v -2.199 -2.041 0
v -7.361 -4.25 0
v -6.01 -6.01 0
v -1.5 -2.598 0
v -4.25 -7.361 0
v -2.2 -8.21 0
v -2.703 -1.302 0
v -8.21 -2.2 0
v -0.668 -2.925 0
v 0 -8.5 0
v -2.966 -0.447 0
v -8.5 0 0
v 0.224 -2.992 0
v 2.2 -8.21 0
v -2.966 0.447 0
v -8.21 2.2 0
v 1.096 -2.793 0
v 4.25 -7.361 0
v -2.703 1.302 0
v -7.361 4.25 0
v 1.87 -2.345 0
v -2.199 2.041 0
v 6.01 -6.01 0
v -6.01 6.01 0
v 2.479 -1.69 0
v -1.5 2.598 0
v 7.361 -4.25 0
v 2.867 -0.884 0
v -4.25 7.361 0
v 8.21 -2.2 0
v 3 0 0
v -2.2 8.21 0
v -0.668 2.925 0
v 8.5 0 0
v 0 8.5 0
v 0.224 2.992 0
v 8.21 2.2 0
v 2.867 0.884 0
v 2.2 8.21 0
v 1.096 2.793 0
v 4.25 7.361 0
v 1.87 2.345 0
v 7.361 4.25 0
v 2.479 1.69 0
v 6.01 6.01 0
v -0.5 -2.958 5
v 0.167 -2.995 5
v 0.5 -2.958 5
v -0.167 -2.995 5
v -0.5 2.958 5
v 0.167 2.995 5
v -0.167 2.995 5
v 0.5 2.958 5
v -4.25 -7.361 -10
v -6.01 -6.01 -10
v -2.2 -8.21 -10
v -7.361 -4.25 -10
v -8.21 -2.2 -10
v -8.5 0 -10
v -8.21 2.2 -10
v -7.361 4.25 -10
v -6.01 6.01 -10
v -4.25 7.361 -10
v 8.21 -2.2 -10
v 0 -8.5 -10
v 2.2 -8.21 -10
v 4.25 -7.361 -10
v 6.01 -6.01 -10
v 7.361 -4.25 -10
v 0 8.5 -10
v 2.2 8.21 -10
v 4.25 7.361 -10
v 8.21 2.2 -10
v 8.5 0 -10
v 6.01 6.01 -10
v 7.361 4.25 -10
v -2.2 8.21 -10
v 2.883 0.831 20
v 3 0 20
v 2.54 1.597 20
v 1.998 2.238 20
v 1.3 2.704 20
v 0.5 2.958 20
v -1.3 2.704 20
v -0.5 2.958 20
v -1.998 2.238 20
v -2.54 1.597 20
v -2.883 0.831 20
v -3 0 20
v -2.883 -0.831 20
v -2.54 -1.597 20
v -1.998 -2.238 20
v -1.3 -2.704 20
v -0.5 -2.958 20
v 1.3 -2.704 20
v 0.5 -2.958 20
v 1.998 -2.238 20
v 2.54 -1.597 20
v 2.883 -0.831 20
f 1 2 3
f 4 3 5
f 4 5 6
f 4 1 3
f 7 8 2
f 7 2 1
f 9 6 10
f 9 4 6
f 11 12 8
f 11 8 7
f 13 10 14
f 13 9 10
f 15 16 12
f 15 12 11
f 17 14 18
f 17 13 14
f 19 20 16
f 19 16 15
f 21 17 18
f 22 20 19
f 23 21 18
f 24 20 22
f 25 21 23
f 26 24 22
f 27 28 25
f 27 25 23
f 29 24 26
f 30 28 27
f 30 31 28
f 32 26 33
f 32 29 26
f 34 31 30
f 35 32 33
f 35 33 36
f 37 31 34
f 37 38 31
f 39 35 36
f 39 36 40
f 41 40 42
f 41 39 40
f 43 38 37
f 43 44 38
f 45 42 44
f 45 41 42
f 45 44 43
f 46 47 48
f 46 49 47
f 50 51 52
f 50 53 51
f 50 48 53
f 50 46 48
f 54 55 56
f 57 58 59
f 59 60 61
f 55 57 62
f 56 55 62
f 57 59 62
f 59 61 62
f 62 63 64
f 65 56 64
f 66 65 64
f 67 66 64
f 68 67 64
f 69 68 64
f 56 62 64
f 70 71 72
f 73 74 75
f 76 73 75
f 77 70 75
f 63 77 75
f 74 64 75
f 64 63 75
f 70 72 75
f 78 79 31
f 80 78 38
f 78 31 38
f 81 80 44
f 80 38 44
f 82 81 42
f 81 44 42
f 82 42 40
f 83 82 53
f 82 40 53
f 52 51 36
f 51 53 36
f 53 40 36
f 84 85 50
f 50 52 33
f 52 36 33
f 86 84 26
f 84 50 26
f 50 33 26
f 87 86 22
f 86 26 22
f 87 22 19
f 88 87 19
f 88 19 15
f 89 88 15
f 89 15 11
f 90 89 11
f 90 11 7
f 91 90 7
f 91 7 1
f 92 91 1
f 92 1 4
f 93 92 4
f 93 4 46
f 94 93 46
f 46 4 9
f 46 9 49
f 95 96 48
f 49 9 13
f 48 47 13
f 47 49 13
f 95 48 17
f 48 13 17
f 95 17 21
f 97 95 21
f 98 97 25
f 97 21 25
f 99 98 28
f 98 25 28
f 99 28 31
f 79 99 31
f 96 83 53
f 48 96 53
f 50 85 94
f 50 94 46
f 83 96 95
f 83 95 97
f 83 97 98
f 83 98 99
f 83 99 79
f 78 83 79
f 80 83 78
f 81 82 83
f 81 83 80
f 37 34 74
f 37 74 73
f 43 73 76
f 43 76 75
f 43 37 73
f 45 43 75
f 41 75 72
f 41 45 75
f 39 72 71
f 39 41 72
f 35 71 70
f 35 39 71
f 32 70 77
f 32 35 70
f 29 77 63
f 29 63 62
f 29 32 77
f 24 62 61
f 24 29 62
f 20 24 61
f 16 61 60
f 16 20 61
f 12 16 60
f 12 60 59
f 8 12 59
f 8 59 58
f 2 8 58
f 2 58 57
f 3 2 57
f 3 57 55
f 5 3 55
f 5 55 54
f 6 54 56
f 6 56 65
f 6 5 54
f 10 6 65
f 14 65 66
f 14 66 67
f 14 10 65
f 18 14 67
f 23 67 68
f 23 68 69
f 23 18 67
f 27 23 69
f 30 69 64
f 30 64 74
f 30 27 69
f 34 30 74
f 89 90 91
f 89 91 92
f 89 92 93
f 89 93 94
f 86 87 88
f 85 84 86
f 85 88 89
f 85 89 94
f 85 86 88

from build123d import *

# Parameters (mm, degrees)
SKETCH1_R               = 3
BOSS_EXTRUDE1_DEPTH     = 20
SKETCH1_3_R             = 8.5
BOSS_EXTRUDE2_DEPTH     = 10
CUT_EXTRUDE1_DEPTH      = 0.5
CUT_EXTRUDE1_DEPTH_BACK = 0.5
SKETCH2_W               = 15
SKETCH2_H               = 6


with BuildPart() as part:
    # Sketch1 → Boss-Extrude1 (new body)
    with BuildSketch(Plane.XY):
        Circle(SKETCH1_R)
    extrude(amount=BOSS_EXTRUDE1_DEPTH)

    # Sketch1<3> → Boss-Extrude2 (add)
    with BuildSketch(Plane.XY):
        Circle(SKETCH1_3_R)
    extrude(amount=-BOSS_EXTRUDE2_DEPTH)

    # Sketch2 → Cut-Extrude1 (cut, two sides: drawn at the far end of the back side and taken through both)
    with BuildSketch(Plane(origin=(0, 0, 0), x_dir=(0, 0, -1), z_dir=(1, 0, 0)).offset(-CUT_EXTRUDE1_DEPTH_BACK)):
        with Locations((-12.5, 0)):
            Rectangle(SKETCH2_W, SKETCH2_H)
    extrude(amount=CUT_EXTRUDE1_DEPTH + CUT_EXTRUDE1_DEPTH_BACK, mode=Mode.SUBTRACT)


solid = part.part
